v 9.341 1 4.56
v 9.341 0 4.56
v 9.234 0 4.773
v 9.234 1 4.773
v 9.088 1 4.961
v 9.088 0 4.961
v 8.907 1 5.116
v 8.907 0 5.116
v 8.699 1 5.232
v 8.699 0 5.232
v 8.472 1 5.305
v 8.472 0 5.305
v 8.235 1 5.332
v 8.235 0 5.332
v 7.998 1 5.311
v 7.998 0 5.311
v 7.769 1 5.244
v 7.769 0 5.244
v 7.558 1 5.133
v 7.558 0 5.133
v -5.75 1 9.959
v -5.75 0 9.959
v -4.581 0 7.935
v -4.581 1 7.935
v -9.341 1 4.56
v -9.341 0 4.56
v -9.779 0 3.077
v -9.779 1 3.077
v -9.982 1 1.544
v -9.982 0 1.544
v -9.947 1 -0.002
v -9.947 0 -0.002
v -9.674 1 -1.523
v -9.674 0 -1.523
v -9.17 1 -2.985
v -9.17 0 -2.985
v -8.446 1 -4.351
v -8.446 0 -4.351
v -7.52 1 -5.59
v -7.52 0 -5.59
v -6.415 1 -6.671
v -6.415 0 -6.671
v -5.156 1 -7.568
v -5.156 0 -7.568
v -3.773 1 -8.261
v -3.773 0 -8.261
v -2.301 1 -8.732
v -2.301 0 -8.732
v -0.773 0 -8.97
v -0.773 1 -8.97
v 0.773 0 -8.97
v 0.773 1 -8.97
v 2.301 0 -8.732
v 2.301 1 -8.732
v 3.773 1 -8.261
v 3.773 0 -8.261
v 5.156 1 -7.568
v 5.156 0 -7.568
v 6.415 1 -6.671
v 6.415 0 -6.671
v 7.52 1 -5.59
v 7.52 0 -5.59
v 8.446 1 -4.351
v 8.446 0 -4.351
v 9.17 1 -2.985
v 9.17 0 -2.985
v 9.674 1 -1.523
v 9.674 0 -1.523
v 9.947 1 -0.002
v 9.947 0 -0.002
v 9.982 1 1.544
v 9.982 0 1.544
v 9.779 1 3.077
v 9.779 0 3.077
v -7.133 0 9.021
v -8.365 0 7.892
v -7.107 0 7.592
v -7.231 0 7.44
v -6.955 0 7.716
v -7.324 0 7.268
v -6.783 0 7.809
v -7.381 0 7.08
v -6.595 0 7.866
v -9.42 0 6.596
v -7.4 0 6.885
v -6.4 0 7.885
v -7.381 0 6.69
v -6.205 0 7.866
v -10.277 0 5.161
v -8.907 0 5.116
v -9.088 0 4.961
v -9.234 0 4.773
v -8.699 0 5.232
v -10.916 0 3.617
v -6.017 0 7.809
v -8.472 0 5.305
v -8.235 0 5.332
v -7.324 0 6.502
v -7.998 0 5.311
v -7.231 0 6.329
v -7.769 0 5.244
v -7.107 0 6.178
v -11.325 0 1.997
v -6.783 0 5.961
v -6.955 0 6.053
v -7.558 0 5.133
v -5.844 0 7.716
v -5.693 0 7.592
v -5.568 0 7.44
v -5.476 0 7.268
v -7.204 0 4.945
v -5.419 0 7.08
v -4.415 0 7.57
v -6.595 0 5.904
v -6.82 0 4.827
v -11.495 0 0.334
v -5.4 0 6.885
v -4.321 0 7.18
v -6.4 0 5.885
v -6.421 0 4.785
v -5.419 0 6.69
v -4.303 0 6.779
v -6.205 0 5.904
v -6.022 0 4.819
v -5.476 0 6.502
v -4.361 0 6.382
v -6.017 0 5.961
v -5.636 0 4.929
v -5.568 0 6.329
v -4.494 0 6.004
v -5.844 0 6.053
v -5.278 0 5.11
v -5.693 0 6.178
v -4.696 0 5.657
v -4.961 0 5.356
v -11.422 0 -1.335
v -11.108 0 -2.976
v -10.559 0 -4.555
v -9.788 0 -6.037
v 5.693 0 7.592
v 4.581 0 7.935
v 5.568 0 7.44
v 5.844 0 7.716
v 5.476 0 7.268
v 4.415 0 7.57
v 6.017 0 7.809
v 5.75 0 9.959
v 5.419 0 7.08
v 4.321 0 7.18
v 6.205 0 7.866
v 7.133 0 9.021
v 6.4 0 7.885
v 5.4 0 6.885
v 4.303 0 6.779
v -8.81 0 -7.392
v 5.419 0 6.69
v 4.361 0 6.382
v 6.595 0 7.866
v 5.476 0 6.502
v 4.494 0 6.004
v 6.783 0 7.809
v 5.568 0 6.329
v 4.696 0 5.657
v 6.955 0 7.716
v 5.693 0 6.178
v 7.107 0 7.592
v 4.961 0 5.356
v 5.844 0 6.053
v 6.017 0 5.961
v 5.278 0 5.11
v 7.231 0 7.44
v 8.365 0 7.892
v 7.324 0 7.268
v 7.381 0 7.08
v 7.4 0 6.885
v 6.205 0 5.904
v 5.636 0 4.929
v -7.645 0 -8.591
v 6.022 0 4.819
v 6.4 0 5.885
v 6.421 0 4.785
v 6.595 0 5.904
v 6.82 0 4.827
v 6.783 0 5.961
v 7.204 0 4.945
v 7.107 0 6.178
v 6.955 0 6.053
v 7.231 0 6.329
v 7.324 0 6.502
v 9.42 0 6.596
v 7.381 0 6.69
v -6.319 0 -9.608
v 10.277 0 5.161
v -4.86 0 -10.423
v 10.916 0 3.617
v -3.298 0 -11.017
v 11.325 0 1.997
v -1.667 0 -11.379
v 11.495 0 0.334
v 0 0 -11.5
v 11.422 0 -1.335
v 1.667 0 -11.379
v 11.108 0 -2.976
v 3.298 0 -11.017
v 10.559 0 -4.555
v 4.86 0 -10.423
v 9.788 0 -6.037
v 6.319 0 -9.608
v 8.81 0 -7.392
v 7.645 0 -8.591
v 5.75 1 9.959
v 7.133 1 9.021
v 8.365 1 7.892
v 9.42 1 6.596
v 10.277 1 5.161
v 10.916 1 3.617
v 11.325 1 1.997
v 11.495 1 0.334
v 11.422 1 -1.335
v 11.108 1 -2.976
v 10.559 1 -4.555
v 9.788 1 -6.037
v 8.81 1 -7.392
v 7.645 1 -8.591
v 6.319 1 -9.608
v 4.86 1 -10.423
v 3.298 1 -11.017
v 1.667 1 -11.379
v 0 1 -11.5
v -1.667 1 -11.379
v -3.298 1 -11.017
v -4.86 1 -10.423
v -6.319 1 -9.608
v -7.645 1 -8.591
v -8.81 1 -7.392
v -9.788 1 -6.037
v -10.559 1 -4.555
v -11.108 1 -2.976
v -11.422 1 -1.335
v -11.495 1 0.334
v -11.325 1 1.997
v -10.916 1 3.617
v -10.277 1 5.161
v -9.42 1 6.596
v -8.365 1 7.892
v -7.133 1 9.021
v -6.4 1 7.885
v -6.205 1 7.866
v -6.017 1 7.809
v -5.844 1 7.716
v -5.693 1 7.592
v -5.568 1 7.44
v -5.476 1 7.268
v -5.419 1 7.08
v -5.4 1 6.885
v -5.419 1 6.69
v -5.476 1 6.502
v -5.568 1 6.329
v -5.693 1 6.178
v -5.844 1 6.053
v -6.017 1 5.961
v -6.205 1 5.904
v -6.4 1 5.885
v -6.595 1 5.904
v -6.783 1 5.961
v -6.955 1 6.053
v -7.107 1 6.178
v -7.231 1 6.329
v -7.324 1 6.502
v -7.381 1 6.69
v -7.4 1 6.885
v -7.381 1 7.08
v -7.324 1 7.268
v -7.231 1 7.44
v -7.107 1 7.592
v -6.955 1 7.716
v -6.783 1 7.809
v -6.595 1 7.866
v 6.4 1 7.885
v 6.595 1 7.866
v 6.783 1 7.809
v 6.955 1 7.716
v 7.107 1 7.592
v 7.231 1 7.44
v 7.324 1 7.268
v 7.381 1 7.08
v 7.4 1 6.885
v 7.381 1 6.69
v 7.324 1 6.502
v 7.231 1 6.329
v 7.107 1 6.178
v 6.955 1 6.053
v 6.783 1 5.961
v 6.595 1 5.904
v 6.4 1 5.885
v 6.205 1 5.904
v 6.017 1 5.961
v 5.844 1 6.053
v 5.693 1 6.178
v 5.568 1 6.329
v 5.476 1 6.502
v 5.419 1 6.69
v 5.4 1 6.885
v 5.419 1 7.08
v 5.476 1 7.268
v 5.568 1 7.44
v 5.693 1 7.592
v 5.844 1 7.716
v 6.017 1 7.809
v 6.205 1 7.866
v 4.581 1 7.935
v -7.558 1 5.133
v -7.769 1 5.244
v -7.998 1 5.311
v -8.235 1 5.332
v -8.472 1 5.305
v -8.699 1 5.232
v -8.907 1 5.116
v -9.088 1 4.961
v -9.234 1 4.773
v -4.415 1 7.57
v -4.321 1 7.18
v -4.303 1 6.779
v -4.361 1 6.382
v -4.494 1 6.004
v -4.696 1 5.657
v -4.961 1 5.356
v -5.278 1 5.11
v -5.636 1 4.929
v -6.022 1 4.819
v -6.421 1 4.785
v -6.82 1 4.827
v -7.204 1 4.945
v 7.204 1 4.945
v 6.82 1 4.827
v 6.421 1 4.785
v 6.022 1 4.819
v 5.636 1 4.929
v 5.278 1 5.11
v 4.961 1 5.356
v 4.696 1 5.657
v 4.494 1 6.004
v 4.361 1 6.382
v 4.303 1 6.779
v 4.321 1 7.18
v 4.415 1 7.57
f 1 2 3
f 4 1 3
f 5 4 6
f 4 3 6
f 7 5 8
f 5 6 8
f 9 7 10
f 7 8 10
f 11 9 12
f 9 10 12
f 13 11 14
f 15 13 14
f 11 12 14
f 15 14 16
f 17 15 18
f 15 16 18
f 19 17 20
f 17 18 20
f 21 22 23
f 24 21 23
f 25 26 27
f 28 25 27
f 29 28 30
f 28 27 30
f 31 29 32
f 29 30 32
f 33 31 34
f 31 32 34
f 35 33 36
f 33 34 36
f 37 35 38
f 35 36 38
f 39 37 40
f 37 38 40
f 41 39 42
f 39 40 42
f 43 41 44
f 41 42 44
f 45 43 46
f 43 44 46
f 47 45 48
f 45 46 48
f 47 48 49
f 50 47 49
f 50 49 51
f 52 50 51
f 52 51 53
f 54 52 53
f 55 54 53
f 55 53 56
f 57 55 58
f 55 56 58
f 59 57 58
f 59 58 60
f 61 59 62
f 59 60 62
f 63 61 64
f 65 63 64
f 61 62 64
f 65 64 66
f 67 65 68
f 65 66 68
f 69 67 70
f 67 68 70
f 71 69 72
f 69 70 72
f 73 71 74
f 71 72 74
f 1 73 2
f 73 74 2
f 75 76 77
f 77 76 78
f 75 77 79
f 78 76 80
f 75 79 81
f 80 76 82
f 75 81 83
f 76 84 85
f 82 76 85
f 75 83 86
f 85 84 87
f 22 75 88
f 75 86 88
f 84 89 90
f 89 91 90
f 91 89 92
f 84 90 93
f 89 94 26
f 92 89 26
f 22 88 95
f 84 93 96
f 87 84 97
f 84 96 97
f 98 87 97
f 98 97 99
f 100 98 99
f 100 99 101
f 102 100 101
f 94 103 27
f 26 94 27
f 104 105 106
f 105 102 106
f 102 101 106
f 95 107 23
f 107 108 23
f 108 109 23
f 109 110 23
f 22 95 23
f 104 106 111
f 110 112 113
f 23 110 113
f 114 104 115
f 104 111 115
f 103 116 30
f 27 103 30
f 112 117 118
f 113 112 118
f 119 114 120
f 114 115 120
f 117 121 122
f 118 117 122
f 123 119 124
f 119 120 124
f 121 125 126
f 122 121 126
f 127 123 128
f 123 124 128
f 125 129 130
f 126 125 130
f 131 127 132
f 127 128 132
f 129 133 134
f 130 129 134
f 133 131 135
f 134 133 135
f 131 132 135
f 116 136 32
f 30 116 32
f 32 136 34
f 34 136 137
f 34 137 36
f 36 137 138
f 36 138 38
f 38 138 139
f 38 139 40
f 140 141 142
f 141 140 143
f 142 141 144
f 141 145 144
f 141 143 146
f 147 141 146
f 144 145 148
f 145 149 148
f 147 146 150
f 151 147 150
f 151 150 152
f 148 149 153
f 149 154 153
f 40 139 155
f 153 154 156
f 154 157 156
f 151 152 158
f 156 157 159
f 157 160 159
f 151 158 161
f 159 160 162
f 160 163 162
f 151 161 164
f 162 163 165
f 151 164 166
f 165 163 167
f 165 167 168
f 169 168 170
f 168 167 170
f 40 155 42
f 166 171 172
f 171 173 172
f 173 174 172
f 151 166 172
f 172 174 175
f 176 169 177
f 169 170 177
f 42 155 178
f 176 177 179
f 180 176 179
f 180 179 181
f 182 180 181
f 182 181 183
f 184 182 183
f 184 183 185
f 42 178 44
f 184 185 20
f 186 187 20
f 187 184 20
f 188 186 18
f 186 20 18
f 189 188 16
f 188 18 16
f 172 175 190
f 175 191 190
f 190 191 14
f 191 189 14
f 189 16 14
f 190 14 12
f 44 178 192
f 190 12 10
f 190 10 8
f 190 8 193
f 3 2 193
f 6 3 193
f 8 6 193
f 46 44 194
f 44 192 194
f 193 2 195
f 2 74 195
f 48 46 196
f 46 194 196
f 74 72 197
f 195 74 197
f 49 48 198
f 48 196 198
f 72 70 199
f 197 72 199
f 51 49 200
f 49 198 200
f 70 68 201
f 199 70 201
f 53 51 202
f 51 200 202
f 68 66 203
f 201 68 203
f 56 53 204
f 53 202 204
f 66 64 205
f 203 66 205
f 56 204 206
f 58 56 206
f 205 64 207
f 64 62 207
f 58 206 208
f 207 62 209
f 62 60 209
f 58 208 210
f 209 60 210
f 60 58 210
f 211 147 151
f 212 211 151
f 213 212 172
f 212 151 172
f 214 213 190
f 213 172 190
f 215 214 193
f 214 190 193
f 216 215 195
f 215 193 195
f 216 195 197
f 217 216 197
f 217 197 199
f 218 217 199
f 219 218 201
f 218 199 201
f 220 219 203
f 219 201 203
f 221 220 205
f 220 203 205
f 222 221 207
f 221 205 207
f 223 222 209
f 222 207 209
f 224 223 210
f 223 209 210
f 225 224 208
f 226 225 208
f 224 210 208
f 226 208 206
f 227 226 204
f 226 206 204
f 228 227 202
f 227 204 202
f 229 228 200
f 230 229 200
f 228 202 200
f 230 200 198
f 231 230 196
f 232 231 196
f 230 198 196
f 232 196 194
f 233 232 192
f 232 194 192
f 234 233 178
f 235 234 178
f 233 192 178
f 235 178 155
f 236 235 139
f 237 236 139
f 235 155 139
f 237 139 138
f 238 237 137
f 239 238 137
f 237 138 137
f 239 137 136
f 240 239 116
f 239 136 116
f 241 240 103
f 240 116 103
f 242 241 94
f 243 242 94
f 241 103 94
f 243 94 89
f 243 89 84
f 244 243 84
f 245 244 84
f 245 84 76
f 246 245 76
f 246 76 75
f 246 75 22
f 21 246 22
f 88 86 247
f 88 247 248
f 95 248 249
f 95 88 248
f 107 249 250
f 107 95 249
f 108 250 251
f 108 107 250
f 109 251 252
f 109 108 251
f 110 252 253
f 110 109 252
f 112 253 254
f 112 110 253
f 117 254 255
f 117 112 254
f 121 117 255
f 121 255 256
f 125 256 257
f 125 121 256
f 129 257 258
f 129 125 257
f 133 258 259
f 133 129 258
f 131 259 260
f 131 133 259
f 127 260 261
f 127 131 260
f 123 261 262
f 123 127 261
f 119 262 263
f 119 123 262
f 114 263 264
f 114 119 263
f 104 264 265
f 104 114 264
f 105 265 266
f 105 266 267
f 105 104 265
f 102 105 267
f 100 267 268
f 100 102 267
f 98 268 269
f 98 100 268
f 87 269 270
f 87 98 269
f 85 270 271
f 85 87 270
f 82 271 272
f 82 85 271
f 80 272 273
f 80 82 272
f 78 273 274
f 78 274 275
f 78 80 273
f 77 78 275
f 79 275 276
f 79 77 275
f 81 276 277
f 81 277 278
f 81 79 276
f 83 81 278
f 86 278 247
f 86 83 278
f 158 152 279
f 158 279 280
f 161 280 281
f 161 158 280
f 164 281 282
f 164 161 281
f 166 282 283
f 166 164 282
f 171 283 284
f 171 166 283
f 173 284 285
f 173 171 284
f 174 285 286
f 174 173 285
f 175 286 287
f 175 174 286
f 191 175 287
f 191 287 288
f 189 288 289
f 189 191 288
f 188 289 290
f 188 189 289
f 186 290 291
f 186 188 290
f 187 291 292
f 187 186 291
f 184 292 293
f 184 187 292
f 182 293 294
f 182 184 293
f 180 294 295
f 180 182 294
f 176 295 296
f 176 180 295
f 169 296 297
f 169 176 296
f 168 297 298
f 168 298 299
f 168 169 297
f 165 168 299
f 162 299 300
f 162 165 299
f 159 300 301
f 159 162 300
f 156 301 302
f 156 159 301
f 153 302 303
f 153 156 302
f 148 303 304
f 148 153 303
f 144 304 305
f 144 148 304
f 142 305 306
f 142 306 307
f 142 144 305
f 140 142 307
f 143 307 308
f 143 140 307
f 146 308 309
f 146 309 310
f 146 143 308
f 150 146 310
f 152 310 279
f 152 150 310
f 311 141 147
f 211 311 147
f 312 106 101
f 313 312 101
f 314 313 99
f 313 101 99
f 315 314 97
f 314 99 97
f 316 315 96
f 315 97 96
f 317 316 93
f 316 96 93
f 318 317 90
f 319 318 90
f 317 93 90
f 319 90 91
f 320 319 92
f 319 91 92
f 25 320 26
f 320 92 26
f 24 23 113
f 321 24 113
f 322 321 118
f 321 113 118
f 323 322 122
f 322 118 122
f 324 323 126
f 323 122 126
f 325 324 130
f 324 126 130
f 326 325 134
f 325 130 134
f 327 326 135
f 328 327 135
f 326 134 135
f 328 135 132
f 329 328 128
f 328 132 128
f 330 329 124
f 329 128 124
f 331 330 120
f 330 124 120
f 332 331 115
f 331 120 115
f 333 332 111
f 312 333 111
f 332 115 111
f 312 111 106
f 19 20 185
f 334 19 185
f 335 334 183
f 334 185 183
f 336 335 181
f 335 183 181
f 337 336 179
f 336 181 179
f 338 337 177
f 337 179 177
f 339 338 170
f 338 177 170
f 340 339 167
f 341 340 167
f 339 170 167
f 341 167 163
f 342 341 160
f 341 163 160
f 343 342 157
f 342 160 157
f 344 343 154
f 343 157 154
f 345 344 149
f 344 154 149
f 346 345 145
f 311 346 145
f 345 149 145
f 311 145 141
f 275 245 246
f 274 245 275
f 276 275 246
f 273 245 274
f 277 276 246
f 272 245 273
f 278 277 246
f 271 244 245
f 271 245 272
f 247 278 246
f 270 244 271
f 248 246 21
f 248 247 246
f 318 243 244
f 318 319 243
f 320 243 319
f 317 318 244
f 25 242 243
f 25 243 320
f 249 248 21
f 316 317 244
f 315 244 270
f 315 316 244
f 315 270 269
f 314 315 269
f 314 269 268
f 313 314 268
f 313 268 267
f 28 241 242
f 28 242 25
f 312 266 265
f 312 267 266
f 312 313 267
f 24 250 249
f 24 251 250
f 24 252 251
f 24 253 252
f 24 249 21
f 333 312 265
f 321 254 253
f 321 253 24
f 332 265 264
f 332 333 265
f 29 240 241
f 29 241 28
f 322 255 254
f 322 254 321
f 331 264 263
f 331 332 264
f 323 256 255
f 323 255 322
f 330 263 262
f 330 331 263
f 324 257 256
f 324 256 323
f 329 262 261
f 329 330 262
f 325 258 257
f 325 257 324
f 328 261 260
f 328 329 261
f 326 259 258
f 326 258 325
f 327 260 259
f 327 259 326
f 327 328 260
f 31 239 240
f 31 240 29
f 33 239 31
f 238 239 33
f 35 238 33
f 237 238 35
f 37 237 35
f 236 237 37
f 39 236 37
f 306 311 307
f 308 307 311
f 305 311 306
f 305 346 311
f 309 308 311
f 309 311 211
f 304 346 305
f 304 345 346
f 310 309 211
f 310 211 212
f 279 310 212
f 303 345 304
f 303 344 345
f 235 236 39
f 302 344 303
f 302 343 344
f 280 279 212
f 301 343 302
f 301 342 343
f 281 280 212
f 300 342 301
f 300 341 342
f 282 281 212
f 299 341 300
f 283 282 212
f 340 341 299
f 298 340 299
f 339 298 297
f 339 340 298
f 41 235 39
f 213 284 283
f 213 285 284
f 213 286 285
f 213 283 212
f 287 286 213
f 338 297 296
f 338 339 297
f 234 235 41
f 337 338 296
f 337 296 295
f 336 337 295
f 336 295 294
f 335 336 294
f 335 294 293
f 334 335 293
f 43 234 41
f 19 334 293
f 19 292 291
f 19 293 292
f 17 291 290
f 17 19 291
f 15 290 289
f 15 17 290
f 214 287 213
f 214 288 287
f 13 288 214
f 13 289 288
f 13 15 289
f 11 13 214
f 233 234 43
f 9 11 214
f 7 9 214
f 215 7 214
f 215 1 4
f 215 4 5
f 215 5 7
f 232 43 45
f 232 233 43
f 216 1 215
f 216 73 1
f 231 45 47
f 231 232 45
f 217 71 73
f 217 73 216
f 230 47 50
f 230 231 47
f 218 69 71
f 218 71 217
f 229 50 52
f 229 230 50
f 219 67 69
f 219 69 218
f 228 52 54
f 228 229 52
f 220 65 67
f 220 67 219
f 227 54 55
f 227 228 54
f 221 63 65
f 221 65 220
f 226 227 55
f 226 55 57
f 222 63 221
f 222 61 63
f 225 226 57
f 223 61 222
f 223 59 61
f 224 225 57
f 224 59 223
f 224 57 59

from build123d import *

# Parameters (mm, degrees)
SKETCH_1_R      = 1
EXTRUDE_1_DEPTH = 1


with BuildPart() as part:
    # 草图1 → 凸台-拉伸1 (new body)
    with BuildSketch(Plane(origin=(0, 0, 0), x_dir=(1, 0, 0), z_dir=(0, 1, 0))):
        with BuildLine():
            Line((-5.75, -9.959292144), (-4.58121163, -7.934891304))
            ThreePointArc((-4.58121163, -7.934891304), (-4.960583519, -5.355685993), (-7.558022947, -5.1331293))
            ThreePointArc((-7.558022947, -5.1331293), (-8.587203168, -5.274503777), (-9.341056075, -4.559727963))
            ThreePointArc((-9.341056075, -4.559727963), (0, 9), (9.341056075, -4.559727963))
            ThreePointArc((9.341056075, -4.559727963), (8.587203168, -5.274503777), (7.558022947, -5.1331293))
            ThreePointArc((7.558022947, -5.1331293), (4.960583519, -5.355685993), (4.58121163, -7.934891304))
            Line((4.58121163, -7.934891304), (5.75, -9.959292144))
            ThreePointArc((5.75, -9.959292144), (0, 11.5), (-5.75, -9.959292144))
        make_face()
        with Locations(Location((-6.399864978, -6.884891304, 0), (0, 0, 270))):
            Circle(SKETCH_1_R, mode=Mode.SUBTRACT)
        with Locations(Location((6.399864978, -6.884891304, 0), (0, 0, 270))):
            Circle(SKETCH_1_R, mode=Mode.SUBTRACT)
    extrude(amount=EXTRUDE_1_DEPTH)


solid = part.part
